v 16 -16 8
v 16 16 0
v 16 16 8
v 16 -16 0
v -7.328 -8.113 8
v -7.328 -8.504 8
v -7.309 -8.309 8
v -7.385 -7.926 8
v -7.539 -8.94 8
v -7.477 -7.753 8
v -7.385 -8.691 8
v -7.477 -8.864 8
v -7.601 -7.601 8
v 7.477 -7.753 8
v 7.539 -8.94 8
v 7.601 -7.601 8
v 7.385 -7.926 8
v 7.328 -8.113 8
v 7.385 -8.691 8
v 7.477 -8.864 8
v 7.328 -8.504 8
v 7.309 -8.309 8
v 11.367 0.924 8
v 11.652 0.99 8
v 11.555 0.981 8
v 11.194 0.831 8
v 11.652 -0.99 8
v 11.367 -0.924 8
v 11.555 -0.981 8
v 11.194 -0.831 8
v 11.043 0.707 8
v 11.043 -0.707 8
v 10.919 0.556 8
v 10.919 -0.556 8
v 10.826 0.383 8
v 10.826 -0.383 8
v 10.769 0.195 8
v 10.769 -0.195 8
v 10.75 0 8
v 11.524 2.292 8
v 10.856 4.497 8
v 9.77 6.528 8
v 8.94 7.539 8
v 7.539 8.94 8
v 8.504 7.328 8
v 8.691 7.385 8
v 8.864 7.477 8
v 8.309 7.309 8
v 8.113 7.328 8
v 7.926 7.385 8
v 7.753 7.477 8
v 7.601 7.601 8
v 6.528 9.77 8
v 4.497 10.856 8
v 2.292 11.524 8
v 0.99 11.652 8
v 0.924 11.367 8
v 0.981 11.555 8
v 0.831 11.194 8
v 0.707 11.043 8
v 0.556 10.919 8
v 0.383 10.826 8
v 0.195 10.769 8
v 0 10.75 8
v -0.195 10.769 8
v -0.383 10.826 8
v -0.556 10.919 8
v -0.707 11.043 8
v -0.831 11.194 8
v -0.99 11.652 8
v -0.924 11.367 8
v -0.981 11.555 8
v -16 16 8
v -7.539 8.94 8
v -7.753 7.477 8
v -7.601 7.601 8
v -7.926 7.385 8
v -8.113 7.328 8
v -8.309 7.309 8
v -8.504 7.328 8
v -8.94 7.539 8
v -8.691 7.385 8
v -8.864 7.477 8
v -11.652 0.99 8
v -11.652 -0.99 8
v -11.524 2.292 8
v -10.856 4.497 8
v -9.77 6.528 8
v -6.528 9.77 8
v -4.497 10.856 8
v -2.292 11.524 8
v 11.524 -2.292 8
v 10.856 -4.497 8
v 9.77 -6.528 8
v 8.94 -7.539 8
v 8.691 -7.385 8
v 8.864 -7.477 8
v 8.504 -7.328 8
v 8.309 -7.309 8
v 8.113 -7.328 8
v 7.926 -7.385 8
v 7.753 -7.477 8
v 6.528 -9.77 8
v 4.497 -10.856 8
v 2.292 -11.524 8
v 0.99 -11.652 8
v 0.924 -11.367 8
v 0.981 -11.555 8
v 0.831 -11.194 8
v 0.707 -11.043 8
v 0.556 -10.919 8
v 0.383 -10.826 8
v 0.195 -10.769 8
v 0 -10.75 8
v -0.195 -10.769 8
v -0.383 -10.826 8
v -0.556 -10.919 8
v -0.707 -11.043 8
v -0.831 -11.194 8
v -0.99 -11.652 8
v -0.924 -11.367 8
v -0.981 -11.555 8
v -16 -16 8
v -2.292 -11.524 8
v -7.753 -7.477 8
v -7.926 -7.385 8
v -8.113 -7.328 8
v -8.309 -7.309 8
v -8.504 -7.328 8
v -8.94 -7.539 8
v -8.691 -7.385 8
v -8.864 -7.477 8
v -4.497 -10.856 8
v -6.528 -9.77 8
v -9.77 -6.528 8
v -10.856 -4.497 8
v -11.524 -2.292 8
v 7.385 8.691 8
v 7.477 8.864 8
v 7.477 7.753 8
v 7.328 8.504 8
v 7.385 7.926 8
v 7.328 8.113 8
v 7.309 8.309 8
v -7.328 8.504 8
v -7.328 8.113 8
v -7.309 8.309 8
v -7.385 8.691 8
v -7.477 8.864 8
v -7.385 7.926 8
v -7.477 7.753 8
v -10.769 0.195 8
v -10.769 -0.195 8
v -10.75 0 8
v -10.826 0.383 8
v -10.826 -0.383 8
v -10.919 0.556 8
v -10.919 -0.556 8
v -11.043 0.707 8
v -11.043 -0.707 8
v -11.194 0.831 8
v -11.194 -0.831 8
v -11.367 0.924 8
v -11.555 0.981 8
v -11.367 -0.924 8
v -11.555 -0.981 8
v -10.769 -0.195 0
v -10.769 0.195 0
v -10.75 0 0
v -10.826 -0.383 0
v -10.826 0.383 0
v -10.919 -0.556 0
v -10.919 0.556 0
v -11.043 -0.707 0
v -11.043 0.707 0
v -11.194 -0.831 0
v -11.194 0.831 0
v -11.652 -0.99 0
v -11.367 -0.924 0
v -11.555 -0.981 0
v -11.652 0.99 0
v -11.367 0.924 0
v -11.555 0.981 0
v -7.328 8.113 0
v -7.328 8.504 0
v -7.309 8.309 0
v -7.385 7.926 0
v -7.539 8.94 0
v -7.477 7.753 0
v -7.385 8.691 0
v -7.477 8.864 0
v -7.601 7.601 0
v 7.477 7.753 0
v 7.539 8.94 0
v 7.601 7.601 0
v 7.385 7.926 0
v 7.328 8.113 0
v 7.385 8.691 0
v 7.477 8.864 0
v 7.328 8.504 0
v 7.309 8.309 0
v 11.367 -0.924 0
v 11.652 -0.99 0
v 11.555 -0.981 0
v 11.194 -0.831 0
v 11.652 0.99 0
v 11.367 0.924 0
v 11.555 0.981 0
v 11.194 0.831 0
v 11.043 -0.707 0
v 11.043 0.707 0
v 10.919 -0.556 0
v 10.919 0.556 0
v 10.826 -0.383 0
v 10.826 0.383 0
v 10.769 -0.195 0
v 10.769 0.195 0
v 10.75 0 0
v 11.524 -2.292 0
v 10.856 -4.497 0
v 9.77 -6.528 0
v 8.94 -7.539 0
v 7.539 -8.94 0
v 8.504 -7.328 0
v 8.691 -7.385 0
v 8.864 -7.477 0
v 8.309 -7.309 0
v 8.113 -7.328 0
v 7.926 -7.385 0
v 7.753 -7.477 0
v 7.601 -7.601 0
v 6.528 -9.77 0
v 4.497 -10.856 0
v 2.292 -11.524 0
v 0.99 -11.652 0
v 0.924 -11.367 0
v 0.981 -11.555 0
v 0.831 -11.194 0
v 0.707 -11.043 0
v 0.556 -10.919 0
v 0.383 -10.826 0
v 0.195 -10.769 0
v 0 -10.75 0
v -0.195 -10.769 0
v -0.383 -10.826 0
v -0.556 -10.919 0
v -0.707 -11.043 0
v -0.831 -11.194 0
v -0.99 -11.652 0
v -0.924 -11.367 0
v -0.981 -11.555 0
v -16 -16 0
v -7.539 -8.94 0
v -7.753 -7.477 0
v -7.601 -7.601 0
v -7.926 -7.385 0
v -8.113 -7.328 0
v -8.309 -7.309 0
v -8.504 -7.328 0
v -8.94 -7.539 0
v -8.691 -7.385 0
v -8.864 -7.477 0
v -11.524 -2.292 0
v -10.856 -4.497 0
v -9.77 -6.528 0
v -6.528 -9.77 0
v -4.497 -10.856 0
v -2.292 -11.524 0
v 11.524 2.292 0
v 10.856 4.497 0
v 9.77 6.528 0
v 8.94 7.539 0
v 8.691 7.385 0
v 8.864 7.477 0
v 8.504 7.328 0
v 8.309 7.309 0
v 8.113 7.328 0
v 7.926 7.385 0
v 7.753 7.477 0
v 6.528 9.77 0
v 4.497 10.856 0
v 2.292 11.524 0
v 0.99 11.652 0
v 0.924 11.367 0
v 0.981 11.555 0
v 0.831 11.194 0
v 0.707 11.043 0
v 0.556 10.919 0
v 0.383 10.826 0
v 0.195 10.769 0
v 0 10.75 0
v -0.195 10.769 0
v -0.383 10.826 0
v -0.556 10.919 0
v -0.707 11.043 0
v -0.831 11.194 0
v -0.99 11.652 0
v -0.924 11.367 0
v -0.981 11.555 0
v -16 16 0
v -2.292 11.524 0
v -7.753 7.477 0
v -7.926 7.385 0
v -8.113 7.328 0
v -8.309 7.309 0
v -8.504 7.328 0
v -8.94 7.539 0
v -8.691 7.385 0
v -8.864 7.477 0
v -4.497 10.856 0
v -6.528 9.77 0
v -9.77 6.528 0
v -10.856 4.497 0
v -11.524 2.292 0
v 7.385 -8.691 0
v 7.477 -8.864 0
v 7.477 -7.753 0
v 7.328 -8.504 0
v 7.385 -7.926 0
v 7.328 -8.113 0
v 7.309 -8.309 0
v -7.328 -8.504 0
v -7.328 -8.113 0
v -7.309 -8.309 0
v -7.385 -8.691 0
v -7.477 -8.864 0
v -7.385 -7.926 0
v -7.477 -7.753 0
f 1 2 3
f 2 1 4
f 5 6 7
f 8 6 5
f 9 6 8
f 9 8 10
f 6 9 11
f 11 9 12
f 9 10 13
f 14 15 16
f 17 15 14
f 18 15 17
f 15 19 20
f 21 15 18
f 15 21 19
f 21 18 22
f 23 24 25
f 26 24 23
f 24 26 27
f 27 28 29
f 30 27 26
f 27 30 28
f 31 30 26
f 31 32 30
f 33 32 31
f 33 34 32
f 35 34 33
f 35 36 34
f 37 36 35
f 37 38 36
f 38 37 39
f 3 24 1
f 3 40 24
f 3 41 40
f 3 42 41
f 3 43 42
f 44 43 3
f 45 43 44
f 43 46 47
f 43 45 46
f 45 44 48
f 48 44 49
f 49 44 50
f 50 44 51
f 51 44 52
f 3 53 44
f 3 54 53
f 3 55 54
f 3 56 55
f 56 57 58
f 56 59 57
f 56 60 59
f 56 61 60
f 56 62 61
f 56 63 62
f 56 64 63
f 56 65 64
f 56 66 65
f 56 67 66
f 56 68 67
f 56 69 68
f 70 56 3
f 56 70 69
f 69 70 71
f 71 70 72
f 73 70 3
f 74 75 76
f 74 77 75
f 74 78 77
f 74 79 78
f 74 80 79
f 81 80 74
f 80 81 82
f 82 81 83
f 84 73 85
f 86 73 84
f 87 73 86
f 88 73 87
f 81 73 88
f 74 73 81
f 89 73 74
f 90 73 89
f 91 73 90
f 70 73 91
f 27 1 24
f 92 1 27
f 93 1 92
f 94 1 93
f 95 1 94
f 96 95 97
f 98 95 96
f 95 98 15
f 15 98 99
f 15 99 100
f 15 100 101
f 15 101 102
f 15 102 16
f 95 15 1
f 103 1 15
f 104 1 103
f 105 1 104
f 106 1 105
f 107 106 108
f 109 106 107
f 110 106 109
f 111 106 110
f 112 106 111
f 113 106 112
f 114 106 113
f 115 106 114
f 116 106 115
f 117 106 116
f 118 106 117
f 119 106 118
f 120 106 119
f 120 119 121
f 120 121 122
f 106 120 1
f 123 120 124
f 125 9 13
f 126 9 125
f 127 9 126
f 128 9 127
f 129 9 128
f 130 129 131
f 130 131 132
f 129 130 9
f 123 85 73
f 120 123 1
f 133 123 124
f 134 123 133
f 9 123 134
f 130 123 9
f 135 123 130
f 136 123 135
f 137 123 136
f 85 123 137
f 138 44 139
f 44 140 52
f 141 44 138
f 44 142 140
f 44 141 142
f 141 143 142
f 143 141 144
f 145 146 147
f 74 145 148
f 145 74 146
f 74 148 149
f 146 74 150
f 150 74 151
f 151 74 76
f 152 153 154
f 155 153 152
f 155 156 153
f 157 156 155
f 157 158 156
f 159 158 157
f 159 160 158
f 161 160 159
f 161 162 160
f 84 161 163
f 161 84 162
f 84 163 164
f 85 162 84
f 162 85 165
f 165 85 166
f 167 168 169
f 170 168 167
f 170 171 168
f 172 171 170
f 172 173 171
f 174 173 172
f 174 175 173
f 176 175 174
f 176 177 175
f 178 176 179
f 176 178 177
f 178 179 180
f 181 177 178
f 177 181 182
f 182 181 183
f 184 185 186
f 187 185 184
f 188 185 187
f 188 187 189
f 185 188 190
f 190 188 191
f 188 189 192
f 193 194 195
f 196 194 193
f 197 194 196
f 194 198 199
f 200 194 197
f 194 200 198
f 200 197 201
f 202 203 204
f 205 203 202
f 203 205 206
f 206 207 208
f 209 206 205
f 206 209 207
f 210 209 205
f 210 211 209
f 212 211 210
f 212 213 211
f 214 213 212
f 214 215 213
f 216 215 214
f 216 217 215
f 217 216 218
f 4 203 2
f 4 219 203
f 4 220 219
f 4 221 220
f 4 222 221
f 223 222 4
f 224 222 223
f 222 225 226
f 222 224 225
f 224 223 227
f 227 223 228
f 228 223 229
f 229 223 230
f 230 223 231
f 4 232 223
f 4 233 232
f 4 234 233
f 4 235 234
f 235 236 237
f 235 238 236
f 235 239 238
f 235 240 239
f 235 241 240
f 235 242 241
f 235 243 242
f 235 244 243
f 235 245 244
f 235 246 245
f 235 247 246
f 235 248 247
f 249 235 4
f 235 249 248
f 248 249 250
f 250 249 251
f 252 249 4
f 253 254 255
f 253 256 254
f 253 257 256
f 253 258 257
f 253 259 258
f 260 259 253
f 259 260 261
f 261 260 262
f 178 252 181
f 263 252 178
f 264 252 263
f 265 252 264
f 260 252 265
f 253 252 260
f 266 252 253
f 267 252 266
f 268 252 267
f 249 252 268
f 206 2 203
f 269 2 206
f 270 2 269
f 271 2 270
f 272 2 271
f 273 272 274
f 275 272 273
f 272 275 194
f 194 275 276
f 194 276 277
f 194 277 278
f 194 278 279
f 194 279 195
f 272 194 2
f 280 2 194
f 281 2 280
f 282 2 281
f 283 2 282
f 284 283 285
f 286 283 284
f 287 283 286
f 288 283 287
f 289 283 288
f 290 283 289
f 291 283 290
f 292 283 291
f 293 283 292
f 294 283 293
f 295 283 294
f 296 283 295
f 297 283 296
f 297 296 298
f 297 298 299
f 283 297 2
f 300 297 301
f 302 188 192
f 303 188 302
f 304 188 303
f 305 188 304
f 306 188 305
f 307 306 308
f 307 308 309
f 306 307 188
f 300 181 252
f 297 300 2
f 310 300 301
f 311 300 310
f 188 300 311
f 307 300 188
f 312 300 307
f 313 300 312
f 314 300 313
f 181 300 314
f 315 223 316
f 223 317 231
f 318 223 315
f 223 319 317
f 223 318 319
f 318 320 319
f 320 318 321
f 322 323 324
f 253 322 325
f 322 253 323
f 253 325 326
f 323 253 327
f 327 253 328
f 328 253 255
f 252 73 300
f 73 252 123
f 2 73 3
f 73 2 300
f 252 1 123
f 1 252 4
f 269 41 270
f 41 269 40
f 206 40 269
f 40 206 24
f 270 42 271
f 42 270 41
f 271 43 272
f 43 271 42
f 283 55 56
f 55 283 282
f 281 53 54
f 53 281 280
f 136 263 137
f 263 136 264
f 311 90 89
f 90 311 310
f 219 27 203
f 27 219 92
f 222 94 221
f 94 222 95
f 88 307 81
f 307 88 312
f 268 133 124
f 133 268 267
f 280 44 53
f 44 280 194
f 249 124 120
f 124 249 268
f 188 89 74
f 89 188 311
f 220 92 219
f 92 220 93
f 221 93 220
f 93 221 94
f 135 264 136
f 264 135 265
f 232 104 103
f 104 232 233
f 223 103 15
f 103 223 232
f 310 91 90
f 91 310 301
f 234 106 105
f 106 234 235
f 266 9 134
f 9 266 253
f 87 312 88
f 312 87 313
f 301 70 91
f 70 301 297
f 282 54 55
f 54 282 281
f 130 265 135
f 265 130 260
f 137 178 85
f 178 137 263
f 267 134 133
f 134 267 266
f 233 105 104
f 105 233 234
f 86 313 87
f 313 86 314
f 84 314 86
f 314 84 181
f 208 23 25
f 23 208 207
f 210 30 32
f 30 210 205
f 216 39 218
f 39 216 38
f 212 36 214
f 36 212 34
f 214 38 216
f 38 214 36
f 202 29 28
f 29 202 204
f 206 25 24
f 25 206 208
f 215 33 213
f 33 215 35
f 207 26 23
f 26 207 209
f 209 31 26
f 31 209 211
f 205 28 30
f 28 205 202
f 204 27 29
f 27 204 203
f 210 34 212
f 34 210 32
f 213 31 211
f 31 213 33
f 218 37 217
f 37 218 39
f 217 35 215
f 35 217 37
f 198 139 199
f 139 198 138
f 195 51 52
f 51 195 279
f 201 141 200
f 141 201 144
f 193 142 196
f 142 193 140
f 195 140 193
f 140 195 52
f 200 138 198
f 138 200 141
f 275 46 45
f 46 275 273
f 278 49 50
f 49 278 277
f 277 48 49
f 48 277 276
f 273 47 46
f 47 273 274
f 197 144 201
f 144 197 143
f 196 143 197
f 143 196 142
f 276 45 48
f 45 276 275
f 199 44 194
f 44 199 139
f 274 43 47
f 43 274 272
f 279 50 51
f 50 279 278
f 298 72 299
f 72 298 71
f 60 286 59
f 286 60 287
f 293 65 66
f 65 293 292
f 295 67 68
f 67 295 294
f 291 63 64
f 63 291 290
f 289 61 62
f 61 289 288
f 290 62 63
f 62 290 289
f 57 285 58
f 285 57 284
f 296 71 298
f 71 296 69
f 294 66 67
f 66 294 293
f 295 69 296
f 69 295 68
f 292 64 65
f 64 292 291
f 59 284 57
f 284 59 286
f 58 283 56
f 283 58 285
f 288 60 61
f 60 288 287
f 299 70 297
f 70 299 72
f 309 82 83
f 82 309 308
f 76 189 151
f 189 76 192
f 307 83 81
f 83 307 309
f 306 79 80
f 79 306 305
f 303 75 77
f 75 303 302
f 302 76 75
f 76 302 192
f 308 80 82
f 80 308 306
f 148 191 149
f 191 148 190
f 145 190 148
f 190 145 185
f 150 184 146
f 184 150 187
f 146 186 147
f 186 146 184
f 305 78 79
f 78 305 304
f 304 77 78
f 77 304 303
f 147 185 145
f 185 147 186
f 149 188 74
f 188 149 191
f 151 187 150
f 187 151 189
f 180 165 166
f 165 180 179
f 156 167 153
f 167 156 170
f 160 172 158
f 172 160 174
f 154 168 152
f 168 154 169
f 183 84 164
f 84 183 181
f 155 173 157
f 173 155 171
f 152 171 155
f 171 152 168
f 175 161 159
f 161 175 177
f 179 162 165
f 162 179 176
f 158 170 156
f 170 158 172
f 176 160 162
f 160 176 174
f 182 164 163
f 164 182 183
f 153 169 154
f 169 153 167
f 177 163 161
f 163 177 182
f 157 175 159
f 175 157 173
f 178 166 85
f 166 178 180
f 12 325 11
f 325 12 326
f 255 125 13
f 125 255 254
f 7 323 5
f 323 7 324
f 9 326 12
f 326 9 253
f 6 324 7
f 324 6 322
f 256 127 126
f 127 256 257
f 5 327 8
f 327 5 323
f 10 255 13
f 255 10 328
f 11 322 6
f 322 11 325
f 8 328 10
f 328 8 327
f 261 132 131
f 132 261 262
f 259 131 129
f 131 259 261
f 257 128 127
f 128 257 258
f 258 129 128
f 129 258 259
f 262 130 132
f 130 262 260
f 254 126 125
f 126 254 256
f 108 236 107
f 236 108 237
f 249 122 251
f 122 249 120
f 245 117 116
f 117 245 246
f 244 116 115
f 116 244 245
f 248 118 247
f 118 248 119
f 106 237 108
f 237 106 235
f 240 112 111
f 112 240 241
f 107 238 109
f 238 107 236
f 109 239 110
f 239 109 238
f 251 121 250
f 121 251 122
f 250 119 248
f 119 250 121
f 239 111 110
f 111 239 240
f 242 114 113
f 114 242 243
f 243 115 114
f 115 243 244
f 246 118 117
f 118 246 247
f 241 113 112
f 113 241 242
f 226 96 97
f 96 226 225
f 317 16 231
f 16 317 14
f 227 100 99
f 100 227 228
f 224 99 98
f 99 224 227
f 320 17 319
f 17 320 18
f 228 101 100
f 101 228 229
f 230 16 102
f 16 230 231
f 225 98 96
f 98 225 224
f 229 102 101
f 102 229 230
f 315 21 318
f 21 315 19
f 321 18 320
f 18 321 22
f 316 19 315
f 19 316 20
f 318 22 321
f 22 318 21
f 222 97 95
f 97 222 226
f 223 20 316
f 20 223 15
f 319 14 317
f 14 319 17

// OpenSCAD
// file: ../modules/hex-grid.scad
module hexGrid(hexInradius,height,supportThickness,xLen,yLen,skipCells,cappedCells,color) {

  center=true;

  xu = hexCircumradius(hexInradius-supportThickness/2)*1.5;
  yu = hexInradius*2-supportThickness;
  eu = hexInradius-supportThickness/2;
 
  xdist = center ? -xu*xLen/2+xu/2 : 0;
  ydist = center ? -yu*yLen/2 : 0;

  translate([xdist,ydist,0]) {
    for ( ix = [0 : xLen-1] ){ 
      even=ix%2;
      x = xu*ix; 
      for ( iy = [0 : yLen-even] ){ 
        y = yu*iy+eu*even;

        shouldSkip = search([[ix,iy]], skipCells)[0] >= 0;
        shouldCap = search([[ix,iy]], cappedCells)[0] >= 0;
        
        
      //  color("black", shouldSkip ? 0.1 : 1) label(x,y,ix,iy,hexInradius);

    //    if(!shouldSkip) {
          color(color, shouldSkip ? 0.1 : 1) translate([x,y,0]) hex(hexInradius,supportThickness,height,shouldCap);
      //  }
      }
    }
  }
}

module hex(hexInradius,supportThickness,height,shouldCap) {
  zMove = shouldCap ? 1.6 : -1;
  difference() {
    cylinder(r=hexCircumradius(hexInradius),h=height,$fn=6);
    translate([0,0,zMove]) cylinder(r=hexCircumradius(hexInradius-supportThickness),h=height+2,$fn=6);
  }
}

module label(x,y,ix,iy,hexInradius) {
  translate([x,y,0]) rotate([$vpr[0]-90,$vpr[2],$vpr[1]]) text(text = str("[",ix,",",iy,"]"), size = hexInradius/3, halign = "center", valign = "center");
}

function hexCircumradius(hexInradius) = hexInradius/sqrt(3)*2;
// main file
$fn=32;


use <../modules/hex-grid.scad>

lw=0.4;
t=lw*2;
//rotate([0,0,0]) translate([50,0,0]) pill(pr,ph);
//rotate([0,0,10]) translate([50,0,0]) pill(pr,ph);

// pillHole(pr+0.5,ph,1);

//carousel();
//carouselCap();

//bearingPost();
bearingHole();
//pillBox();
//motorMount();

pr=3.5;
ph=21;

hexR=4.5;

bearingOuterR=11;
//pd=10;

      //  pill(pr,ph);
        //pillHole(pr+0.5,ph,1);
c=35;
a=10;
d=52;

//ring(35,10,52) pill(pr,ph);


module ring(c,a,d) {
  for ( i = [0 : c] ) rotate([0,0,i*a]) translate([d,0,0]) children();
}

module carouselCap() {
  difference() {
    ring(35,10,52) cylinder(r=pr+0.6+t*2,h=8);
    translate([0,0,t]) ring(35,10,52) cylinder(r=pr+0.6+t,h=ph+2);
    translate([0,0,t]) cylinder(r=52,h=8);

  }
}


module carousel() {
  difference() {
    union() {
      ring(35,10,52) cylinder(r=pr+0.5+t,h=ph);

      intersection() {
        hexGrid(hexR,4,t,15,13,[],[]);
        cylinder(r=52,h=10);
      }
    }
    translate([0,0,-1]) ring(35,10,52) cylinder(r=pr+0.5,h=ph+2);
  }
}


module bearingPost() {
  cylinder(r=4,h=8);
  translate([0,0,8]) cylinder(r=5,h=5);
}

module bearingHole() {
  difference() {
    translate([-bearingOuterR-5,-bearingOuterR-5,0]) cube([bearingOuterR*2+10,bearingOuterR*2+10,8]);
    translate([0,0,-1]) cylinder(r=bearingOuterR+0.75,h=10);
  }
  ring(7,45,bearingOuterR+0.75) cylinder(r=1,h=8);
}

module hexPost() {
  cylinder(r=hexCircumradius(hexR-t-0.2),h=5,$fn=6);
  translate([0,0,5]) cylinder(r=hexR,h=5);
}

module pillHole(r,h,t) {
  difference() {
    cylinder(r=r+t,h=h);
    translate([0,0,-1]) cylinder(r=r,h=h+2);
  }
}

module pill(r,h) {
  translate([0,0,r]) {
    sphere(r=r);
    cylinder(r=r,h=h-r*2);
    translate([0,0,h-r*2]) sphere(r=r);
  }
}

module pillBox() {
  t=2;
  w=140;
  h=45;
  translate([-w/2,-w/2,0]) {
    difference() {
      cube([w+t*2,w+t*2,h+t]);
      translate([t,t,t]) cube([w,w,h+t]);
    }
  }
}

module motorMount() {
  difference() {
    translate([-25,-15,0]) cube([50,30,2]);
    translate([35/2,0,-0.5]) cylinder(r=3,h=5);
    translate([-35/2,0,-0.5]) cylinder(r=3,h=5);
    translate([0,8,-0.5]) cylinder(r=5,h=5);
  }
  translate([35/2,0,0]) screwHole();
  translate([-35/2,0,0]) screwHole();
}

module screwHole() {
  difference() {
    cylinder(r=4,h=4);
    translate([0,0,-0.5]) cylinder(r=2,h=5);
  }
}
